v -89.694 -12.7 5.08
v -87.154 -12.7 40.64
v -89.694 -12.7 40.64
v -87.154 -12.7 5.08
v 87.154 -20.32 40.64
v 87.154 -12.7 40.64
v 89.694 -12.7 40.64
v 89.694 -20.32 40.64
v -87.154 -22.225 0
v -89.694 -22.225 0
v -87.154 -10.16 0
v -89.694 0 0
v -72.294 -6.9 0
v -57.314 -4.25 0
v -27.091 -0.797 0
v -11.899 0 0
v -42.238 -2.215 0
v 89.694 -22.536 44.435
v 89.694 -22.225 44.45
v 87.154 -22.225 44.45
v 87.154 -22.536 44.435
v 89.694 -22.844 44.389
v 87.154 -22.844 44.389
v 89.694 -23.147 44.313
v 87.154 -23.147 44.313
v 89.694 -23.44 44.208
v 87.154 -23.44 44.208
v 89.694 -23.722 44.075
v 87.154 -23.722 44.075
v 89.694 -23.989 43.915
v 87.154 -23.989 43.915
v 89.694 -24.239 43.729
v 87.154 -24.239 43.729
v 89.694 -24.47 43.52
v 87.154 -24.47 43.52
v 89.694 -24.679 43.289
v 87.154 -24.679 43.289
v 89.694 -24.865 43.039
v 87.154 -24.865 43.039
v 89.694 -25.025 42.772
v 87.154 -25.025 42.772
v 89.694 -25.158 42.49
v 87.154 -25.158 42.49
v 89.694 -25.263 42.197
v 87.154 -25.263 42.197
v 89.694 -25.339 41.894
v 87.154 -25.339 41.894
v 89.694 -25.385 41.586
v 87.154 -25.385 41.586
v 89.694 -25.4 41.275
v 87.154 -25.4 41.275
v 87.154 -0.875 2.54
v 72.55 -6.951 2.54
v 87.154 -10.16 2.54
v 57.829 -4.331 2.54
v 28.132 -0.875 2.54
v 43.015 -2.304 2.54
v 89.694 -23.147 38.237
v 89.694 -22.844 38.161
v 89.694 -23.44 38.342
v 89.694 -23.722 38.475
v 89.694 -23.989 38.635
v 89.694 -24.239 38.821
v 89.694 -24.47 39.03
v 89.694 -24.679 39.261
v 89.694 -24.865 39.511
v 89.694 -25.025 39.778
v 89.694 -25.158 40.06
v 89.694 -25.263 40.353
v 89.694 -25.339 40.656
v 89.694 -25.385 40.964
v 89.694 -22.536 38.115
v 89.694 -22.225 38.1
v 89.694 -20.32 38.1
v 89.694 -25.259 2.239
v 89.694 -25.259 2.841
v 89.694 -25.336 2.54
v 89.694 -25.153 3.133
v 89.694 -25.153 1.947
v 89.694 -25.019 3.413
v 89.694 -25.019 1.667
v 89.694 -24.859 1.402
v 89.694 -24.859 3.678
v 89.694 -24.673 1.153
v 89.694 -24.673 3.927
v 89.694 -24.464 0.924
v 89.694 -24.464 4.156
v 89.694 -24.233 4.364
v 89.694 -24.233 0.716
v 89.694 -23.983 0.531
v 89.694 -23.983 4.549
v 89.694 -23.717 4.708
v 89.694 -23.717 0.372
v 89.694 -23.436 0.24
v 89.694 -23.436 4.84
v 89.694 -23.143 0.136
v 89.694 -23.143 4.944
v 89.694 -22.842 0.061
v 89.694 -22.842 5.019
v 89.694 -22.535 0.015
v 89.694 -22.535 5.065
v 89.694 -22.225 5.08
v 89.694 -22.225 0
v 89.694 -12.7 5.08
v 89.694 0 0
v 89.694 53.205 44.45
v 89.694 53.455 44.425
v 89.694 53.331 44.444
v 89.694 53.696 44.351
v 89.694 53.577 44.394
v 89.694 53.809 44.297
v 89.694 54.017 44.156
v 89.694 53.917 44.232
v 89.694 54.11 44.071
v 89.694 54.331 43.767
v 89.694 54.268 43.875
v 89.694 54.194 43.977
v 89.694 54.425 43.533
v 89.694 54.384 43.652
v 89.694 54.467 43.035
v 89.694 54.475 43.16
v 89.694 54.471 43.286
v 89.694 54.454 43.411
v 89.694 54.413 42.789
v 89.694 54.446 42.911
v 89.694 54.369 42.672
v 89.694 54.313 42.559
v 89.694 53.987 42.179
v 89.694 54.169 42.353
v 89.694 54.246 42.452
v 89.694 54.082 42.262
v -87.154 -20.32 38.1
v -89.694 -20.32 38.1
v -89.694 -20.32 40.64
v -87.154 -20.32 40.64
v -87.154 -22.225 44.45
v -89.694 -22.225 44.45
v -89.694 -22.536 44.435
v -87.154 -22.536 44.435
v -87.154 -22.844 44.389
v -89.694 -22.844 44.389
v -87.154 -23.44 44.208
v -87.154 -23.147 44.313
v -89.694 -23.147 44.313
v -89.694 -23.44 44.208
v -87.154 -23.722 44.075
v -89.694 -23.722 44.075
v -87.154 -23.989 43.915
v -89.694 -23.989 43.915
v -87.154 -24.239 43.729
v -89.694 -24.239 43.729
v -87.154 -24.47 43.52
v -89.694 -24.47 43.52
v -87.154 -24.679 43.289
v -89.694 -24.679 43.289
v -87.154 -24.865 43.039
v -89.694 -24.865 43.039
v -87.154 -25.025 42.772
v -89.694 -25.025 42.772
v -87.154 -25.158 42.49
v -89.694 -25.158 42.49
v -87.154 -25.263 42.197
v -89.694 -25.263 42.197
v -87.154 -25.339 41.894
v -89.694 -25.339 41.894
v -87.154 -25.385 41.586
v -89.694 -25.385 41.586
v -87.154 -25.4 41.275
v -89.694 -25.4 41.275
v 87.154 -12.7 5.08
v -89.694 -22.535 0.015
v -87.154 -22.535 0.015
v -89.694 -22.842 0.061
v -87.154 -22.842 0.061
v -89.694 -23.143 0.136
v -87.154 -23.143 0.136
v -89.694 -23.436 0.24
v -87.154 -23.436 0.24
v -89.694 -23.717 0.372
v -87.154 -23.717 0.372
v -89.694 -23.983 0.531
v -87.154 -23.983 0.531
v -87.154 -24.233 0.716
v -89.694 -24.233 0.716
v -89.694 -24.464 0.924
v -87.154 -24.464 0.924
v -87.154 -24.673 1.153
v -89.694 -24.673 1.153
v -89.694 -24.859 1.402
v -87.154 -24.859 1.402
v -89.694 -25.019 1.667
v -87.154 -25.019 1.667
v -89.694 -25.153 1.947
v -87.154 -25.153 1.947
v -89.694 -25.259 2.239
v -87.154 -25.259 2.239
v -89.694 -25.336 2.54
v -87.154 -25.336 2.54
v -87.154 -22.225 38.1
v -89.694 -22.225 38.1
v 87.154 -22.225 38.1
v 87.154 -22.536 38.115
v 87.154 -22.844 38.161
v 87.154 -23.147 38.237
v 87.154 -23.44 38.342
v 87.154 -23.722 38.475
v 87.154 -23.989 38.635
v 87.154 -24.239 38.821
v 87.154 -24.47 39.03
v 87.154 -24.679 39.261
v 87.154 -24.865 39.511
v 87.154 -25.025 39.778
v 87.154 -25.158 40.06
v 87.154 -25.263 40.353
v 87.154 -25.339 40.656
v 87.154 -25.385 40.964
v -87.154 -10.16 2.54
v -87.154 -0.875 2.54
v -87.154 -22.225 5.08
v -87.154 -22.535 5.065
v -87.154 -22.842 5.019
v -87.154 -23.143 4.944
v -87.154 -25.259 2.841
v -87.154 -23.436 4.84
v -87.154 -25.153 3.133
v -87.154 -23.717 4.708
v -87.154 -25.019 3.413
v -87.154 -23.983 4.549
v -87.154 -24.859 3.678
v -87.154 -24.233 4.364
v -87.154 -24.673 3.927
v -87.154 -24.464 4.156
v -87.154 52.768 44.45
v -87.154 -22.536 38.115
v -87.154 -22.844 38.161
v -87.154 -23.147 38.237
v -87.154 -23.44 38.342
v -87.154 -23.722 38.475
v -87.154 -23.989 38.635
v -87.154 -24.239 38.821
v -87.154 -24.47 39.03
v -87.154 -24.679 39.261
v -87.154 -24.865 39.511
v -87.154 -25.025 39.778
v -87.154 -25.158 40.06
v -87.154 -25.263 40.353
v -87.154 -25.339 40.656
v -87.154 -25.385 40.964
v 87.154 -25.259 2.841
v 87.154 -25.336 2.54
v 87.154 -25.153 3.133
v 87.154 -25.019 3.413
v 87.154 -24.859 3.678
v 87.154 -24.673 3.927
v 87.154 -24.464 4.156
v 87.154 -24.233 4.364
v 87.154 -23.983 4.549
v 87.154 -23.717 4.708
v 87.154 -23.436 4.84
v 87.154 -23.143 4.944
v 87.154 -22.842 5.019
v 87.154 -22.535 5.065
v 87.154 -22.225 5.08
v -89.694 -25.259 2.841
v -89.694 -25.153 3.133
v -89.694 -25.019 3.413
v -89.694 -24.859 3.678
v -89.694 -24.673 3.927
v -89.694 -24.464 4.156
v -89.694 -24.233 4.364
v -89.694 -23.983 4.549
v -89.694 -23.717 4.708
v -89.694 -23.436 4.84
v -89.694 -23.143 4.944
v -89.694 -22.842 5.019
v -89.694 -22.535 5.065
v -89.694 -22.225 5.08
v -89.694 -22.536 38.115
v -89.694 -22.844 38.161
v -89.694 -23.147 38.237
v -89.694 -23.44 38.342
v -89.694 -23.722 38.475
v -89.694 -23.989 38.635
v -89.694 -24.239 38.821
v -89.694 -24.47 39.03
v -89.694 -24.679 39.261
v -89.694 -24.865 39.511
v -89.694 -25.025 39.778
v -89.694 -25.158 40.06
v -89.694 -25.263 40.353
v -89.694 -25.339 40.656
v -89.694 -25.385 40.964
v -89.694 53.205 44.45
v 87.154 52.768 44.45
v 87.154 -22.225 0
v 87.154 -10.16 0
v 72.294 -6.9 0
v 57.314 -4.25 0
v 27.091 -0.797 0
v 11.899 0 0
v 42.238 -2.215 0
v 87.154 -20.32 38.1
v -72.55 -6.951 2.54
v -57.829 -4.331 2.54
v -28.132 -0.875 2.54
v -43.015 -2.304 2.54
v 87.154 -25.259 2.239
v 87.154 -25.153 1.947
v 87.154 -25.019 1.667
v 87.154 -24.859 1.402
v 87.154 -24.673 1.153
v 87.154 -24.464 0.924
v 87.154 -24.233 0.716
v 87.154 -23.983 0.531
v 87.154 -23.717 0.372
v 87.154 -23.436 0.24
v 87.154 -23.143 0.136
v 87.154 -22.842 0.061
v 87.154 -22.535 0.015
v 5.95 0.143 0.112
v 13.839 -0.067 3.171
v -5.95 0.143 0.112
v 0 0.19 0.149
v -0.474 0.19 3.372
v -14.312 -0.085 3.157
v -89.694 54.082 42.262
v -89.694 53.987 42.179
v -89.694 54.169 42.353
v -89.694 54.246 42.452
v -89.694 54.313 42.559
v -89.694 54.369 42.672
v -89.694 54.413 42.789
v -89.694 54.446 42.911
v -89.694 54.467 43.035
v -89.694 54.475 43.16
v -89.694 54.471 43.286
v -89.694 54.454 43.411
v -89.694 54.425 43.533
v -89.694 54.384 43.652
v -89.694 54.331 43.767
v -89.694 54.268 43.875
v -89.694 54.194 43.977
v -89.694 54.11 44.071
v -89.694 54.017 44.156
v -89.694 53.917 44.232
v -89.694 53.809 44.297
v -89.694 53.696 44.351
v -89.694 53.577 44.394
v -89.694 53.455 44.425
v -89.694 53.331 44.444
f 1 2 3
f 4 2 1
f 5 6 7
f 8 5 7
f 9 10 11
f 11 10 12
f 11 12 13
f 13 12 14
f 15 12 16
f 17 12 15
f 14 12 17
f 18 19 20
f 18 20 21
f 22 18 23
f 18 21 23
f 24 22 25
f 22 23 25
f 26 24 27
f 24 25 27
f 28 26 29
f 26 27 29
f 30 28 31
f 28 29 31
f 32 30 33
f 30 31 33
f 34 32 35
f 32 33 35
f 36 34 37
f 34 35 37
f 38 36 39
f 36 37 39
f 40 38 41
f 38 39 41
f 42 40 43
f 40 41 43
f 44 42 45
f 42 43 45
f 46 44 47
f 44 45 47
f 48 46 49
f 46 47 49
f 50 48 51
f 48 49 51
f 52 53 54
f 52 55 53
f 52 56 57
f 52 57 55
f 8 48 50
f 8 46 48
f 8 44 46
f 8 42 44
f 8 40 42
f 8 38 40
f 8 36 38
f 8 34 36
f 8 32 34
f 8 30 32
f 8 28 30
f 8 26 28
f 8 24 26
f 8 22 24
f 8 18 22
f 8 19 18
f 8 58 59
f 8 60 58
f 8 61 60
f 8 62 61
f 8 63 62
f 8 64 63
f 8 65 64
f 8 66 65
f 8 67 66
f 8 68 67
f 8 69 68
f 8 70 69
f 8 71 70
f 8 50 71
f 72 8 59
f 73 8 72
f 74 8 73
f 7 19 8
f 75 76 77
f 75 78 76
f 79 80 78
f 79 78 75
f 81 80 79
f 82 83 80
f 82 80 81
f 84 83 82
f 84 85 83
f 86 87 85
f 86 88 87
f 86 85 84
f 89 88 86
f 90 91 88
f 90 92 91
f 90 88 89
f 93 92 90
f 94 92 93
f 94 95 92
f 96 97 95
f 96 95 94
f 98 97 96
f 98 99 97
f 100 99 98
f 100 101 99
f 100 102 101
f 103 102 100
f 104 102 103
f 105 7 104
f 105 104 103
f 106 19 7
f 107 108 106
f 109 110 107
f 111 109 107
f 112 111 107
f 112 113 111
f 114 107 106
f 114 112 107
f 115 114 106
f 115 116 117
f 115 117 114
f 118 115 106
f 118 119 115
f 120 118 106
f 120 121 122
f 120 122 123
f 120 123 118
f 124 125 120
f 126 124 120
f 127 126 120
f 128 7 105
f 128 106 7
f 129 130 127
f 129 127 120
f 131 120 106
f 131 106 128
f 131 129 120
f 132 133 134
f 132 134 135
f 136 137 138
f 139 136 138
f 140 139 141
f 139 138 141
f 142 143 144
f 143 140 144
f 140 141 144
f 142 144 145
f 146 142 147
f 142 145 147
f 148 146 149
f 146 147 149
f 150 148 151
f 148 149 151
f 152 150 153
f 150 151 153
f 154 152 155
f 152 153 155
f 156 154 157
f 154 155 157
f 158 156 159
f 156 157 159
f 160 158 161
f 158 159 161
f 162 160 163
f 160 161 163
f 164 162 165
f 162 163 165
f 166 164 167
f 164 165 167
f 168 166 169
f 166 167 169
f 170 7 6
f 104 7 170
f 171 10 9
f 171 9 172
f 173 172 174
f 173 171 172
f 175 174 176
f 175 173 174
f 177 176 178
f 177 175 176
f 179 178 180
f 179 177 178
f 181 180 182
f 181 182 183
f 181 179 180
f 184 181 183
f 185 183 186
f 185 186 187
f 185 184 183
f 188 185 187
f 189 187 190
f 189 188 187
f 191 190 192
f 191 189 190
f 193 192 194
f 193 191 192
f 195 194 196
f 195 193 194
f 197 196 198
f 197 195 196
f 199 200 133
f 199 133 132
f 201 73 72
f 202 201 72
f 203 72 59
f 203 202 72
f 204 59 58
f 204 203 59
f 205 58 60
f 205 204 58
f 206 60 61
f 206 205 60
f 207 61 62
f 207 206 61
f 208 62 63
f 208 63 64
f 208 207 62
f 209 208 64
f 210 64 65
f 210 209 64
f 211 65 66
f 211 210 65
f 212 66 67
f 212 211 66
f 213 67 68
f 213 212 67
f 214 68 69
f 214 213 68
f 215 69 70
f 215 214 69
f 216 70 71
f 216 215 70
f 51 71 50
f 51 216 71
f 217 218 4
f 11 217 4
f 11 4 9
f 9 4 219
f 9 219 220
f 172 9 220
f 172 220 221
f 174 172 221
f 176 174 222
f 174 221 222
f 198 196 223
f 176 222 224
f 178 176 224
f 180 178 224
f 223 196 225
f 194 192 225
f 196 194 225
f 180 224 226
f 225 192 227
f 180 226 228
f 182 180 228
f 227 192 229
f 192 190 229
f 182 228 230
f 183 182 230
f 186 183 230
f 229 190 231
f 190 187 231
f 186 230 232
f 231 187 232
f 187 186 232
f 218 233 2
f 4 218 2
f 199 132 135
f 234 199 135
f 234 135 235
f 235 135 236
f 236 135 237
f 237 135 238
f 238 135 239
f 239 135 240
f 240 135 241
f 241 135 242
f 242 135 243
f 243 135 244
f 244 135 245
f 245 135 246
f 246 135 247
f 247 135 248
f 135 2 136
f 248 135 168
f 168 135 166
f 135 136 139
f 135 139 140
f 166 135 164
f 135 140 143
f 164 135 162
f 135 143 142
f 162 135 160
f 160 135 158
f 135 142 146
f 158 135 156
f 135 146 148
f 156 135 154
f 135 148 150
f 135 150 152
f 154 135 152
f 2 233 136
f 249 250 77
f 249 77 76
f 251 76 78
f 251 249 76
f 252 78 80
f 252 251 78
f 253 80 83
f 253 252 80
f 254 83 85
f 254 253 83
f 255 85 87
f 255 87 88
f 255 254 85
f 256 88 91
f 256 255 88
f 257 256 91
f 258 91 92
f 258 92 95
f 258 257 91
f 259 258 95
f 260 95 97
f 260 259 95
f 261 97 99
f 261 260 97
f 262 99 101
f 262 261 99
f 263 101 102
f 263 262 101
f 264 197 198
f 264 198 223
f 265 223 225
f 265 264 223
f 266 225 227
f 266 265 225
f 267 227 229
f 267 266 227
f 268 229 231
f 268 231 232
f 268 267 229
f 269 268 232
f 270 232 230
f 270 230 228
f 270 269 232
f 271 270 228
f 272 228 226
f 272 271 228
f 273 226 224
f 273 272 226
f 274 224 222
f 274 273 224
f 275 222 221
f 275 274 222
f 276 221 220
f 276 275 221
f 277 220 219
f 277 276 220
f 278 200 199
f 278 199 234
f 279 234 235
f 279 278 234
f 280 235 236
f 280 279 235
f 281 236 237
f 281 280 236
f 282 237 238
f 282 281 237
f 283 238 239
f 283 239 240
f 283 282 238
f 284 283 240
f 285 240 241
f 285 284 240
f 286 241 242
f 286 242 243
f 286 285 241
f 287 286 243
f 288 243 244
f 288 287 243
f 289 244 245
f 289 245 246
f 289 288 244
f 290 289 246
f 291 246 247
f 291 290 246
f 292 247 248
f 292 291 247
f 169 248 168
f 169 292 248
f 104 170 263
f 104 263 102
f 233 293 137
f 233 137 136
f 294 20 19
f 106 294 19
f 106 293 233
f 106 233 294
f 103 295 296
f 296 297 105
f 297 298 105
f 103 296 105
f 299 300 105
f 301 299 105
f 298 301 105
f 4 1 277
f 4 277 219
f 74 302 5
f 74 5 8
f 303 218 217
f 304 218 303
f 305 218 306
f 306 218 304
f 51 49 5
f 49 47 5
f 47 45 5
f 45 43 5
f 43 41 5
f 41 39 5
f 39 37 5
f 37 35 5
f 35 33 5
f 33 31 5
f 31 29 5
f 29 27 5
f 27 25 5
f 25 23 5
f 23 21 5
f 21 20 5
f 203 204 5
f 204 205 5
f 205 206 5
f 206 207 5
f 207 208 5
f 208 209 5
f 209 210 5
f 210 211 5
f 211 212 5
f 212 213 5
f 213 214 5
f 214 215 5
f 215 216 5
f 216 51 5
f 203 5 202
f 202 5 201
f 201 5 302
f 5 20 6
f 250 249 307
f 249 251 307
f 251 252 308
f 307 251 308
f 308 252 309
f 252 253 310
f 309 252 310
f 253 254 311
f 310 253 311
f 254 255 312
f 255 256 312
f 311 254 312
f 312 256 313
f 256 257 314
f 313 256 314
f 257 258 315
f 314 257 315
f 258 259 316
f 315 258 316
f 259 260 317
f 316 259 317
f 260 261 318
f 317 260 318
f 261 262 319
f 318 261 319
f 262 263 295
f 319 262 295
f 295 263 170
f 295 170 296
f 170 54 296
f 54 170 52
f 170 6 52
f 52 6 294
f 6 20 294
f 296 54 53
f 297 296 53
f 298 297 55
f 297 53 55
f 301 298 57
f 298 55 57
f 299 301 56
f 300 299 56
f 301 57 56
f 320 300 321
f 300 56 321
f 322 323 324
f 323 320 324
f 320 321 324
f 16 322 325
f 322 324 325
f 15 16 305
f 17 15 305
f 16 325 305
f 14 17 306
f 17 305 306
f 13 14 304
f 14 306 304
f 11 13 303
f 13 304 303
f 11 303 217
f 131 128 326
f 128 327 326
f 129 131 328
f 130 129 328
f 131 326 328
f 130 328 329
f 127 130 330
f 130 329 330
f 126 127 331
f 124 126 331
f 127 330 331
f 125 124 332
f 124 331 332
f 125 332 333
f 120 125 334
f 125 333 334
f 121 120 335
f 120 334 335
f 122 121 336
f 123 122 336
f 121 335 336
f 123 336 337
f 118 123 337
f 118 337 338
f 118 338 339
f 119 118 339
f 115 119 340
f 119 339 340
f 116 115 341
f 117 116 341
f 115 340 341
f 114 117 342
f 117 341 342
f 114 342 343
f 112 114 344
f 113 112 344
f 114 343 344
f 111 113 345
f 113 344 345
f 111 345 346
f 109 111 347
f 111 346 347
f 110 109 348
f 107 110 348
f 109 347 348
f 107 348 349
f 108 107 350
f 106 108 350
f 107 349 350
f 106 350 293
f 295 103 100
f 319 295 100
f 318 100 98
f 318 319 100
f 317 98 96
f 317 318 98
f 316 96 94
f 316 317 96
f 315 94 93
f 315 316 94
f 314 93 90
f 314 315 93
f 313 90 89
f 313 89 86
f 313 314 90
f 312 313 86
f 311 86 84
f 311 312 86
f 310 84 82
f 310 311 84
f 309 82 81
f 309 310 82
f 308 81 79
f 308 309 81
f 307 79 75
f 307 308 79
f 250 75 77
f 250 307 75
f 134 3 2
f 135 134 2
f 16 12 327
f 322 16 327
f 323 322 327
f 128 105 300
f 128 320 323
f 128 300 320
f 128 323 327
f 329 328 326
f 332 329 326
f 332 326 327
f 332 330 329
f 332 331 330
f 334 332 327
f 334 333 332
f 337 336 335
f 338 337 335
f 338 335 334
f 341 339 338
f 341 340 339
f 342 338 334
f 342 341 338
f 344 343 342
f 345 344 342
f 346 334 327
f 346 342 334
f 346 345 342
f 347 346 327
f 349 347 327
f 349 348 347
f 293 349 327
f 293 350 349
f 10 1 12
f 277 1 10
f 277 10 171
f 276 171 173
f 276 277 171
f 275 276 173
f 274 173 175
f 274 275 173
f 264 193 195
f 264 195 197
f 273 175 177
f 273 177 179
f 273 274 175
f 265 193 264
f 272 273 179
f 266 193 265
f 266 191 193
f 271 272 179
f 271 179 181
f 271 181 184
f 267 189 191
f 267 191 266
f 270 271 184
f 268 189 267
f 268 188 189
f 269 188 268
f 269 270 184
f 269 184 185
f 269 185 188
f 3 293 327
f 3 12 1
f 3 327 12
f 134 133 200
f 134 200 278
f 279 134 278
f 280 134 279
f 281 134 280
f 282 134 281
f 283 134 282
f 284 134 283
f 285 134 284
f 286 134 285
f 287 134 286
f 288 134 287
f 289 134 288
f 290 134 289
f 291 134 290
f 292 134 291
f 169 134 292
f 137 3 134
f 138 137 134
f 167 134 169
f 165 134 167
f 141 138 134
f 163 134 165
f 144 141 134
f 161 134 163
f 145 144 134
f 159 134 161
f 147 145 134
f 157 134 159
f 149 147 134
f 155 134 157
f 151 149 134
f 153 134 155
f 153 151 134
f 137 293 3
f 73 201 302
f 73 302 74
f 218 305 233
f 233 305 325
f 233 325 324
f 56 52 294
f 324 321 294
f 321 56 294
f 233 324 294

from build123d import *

# Parameters (mm, degrees)
F1_DEPTH     = 89.69375
F2_DEPTH     = 12.7
F4_DEPTH     = 44.451
F5_T         = 2.54
F6_R         = 1.27
F7_W         = 2.54
F7_H         = 3.81
F7_H_2       = 5.08
F8_W         = 2.54
F8_H         = 3.81
F8_H_2       = 5.08
F9_DEPTH     = 12.7
F11_W        = 2.54
F11_H        = 5.08
F10_W        = 2.54
F10_H        = 5.08
F12_DEPTH    = 2.54
F13_T1_DEPTH = 18.415
F13_T3_DEPTH = 18.415


# Not quite as in the source:
# - a fillet or chamfer that OpenCascade refuses, or shapes differently, is made with other operations: its cross-section is extruded or revolved along the edge and cut away or added
# - a shell that OpenCascade refuses in one call is made with other operations: the cavity is built on its own and cut out
# - a feature names something its author has since deleted; it is built from what else it names


with BuildPart() as f1:
    # F0 (on Right) → F1 (new body, symmetric)
    with BuildSketch(Plane.YZ):
        Polygon((0, 44.45), (0, 0), (56.893405551, 44.45), align=None)
    extrude(amount=F1_DEPTH, both=True)

    # F2 (add): a face of the model
    f2_faces = [f1.faces().sort_by_distance(p)[0] for p in [
        (0, 0, 22.225),
    ]]
    extrude(f2_faces, amount=F2_DEPTH)

    # F3 (on face) → F4 (cut, through all)
    with BuildSketch(Plane.XY.offset(44.45)):
        with BuildLine():
            Line((-87.15375, -10.16), (-87.15375, -12.7))
            Line((-87.15375, -12.7), (87.15375, -12.7))
            Line((87.15375, -12.7), (87.15375, -10.16))
            ThreePointArc((87.15375, -10.16), (0, 0.1903063345), (-87.15375, -10.16))
        make_face()
    extrude(amount=-F4_DEPTH, mode=Mode.SUBTRACT)

    # F5: shell of thickness 2.54, made by hand


with BuildPart() as f5_core1:
    # F5_t2: copy of F1
    add(f1.part)

    # the walls: a layer under each face that stays
    f5_faces = [f5_core1.faces().sort_by_distance(p)[0] for p in [
        (0, 28.4467027755, 22.225),
        (89.69375, 22.0967027755, 22.225),
        (88.42375, -12.7, 22.225),
        (87.15375, -11.43, 22.225),
        (-87.15375, -11.43, 22.225),
        (-88.42375, -12.7, 22.225),
        (-89.69375, 22.0967027755, 22.225),
        (-76.7280098971, -6.35, 0),
        (50.7965296912, -2.1166666667, 0),
    ]]
    thicken(f5_faces, amount=-F5_T, mode=Mode.SUBTRACT)


with BuildPart() as f1_1:
    add(f1.part)

    # what is left inside the walls is the cavity
    f5_cavity = [f5_core1.part.solids().sort_by_distance(p)[0] for p in [
        (-29.05125, 25.930947, 23.515015),
    ]]
    add(f5_cavity, mode=Mode.SUBTRACT)

    # F6
    f6_edges = [f1_1.edges().sort_by_distance(p)[0] for p in [
        (0, 56.893406, 44.45),
    ]]
    fillet(f6_edges, radius=F6_R)

    # F7 (on face) + F8 (on face) → F9 (join)
    with BuildSketch(Plane.XZ.offset(12.7)):
        with Locations((-88.42375, 42.545)):
            Rectangle(F7_W, F7_H)
        with Locations((-88.42375, 2.54)):
            Rectangle(F7_W, F7_H_2)
    with BuildSketch(Plane.XZ.offset(12.7)):
        with Locations((88.42375, 42.545)):
            Rectangle(F8_W, F8_H)
        with Locations((88.42375, 2.54)):
            Rectangle(F8_W, F8_H_2)
    extrude(amount=F9_DEPTH)

    # F11 (on face) + F10 (on face) → F12 (join)
    with BuildSketch(Plane(origin=(0, 0, 40.64), x_dir=(1, 0, 0), z_dir=(0, 0, -1))):
        with Locations((-88.42375, 22.86)):
            Rectangle(F11_W, F11_H)
    with BuildSketch(Plane(origin=(0, 0, 40.64), x_dir=(1, 0, 0), z_dir=(0, 0, -1))):
        with Locations((88.42375, 22.86)):
            Rectangle(F10_W, F10_H)
    extrude(amount=F12_DEPTH)

    # F13: fillet of radius 3.175 on 8 edges, made by hand

    # F13_s2 → F13_t1 (cut)
    with BuildSketch(Plane.YZ.offset(79.21625)):
        with BuildLine():
            ThreePointArc((-22.225, 44.45), (-24.4700640303, 43.5200640303), (-25.4, 41.275))
            Line((-25.4, 41.275), (-25.4, 44.45))
            Line((-25.4, 44.45), (-22.225, 44.45))
        make_face()
        with BuildLine():
            ThreePointArc((-22.225, 38.1), (-24.4700640303, 39.0299359697), (-25.4, 41.275))
            Line((-25.4, 41.275), (-25.4, 38.1))
            Line((-25.4, 38.1), (-22.225, 38.1))
        make_face()
        with BuildLine():
            ThreePointArc((-25.4, 1.905), (-24.4700640303, 4.1500640303), (-22.225, 5.08))
            Line((-22.225, 5.08), (-25.4, 5.08))
            Line((-25.4, 5.08), (-25.4, 1.905))
        make_face()
        with BuildLine():
            ThreePointArc((-22.225, 0), (-24.4700640303, 0.9299359697), (-25.4, 3.175))
            Line((-25.4, 3.175), (-25.4, 0))
            Line((-25.4, 0), (-22.225, 0))
        make_face()
    extrude(amount=F13_T1_DEPTH, mode=Mode.SUBTRACT)

    # F13_s4 → F13_t3 (cut)
    with BuildSketch(Plane.YZ.offset(-97.63125)):
        with BuildLine():
            ThreePointArc((-22.225, 44.45), (-24.4700640303, 43.5200640303), (-25.4, 41.275))
            Line((-25.4, 41.275), (-25.4, 44.45))
            Line((-25.4, 44.45), (-22.225, 44.45))
        make_face()
        with BuildLine():
            ThreePointArc((-22.225, 38.1), (-24.4700640303, 39.0299359697), (-25.4, 41.275))
            Line((-25.4, 41.275), (-25.4, 38.1))
            Line((-25.4, 38.1), (-22.225, 38.1))
        make_face()
        with BuildLine():
            ThreePointArc((-25.4, 1.905), (-24.4700640303, 4.1500640303), (-22.225, 5.08))
            Line((-22.225, 5.08), (-25.4, 5.08))
            Line((-25.4, 5.08), (-25.4, 1.905))
        make_face()
        with BuildLine():
            ThreePointArc((-22.225, 0), (-24.4700640303, 0.9299359697), (-25.4, 3.175))
            Line((-25.4, 3.175), (-25.4, 0))
            Line((-25.4, 0), (-22.225, 0))
        make_face()
    extrude(amount=F13_T3_DEPTH, mode=Mode.SUBTRACT)


solid = f1_1.part
